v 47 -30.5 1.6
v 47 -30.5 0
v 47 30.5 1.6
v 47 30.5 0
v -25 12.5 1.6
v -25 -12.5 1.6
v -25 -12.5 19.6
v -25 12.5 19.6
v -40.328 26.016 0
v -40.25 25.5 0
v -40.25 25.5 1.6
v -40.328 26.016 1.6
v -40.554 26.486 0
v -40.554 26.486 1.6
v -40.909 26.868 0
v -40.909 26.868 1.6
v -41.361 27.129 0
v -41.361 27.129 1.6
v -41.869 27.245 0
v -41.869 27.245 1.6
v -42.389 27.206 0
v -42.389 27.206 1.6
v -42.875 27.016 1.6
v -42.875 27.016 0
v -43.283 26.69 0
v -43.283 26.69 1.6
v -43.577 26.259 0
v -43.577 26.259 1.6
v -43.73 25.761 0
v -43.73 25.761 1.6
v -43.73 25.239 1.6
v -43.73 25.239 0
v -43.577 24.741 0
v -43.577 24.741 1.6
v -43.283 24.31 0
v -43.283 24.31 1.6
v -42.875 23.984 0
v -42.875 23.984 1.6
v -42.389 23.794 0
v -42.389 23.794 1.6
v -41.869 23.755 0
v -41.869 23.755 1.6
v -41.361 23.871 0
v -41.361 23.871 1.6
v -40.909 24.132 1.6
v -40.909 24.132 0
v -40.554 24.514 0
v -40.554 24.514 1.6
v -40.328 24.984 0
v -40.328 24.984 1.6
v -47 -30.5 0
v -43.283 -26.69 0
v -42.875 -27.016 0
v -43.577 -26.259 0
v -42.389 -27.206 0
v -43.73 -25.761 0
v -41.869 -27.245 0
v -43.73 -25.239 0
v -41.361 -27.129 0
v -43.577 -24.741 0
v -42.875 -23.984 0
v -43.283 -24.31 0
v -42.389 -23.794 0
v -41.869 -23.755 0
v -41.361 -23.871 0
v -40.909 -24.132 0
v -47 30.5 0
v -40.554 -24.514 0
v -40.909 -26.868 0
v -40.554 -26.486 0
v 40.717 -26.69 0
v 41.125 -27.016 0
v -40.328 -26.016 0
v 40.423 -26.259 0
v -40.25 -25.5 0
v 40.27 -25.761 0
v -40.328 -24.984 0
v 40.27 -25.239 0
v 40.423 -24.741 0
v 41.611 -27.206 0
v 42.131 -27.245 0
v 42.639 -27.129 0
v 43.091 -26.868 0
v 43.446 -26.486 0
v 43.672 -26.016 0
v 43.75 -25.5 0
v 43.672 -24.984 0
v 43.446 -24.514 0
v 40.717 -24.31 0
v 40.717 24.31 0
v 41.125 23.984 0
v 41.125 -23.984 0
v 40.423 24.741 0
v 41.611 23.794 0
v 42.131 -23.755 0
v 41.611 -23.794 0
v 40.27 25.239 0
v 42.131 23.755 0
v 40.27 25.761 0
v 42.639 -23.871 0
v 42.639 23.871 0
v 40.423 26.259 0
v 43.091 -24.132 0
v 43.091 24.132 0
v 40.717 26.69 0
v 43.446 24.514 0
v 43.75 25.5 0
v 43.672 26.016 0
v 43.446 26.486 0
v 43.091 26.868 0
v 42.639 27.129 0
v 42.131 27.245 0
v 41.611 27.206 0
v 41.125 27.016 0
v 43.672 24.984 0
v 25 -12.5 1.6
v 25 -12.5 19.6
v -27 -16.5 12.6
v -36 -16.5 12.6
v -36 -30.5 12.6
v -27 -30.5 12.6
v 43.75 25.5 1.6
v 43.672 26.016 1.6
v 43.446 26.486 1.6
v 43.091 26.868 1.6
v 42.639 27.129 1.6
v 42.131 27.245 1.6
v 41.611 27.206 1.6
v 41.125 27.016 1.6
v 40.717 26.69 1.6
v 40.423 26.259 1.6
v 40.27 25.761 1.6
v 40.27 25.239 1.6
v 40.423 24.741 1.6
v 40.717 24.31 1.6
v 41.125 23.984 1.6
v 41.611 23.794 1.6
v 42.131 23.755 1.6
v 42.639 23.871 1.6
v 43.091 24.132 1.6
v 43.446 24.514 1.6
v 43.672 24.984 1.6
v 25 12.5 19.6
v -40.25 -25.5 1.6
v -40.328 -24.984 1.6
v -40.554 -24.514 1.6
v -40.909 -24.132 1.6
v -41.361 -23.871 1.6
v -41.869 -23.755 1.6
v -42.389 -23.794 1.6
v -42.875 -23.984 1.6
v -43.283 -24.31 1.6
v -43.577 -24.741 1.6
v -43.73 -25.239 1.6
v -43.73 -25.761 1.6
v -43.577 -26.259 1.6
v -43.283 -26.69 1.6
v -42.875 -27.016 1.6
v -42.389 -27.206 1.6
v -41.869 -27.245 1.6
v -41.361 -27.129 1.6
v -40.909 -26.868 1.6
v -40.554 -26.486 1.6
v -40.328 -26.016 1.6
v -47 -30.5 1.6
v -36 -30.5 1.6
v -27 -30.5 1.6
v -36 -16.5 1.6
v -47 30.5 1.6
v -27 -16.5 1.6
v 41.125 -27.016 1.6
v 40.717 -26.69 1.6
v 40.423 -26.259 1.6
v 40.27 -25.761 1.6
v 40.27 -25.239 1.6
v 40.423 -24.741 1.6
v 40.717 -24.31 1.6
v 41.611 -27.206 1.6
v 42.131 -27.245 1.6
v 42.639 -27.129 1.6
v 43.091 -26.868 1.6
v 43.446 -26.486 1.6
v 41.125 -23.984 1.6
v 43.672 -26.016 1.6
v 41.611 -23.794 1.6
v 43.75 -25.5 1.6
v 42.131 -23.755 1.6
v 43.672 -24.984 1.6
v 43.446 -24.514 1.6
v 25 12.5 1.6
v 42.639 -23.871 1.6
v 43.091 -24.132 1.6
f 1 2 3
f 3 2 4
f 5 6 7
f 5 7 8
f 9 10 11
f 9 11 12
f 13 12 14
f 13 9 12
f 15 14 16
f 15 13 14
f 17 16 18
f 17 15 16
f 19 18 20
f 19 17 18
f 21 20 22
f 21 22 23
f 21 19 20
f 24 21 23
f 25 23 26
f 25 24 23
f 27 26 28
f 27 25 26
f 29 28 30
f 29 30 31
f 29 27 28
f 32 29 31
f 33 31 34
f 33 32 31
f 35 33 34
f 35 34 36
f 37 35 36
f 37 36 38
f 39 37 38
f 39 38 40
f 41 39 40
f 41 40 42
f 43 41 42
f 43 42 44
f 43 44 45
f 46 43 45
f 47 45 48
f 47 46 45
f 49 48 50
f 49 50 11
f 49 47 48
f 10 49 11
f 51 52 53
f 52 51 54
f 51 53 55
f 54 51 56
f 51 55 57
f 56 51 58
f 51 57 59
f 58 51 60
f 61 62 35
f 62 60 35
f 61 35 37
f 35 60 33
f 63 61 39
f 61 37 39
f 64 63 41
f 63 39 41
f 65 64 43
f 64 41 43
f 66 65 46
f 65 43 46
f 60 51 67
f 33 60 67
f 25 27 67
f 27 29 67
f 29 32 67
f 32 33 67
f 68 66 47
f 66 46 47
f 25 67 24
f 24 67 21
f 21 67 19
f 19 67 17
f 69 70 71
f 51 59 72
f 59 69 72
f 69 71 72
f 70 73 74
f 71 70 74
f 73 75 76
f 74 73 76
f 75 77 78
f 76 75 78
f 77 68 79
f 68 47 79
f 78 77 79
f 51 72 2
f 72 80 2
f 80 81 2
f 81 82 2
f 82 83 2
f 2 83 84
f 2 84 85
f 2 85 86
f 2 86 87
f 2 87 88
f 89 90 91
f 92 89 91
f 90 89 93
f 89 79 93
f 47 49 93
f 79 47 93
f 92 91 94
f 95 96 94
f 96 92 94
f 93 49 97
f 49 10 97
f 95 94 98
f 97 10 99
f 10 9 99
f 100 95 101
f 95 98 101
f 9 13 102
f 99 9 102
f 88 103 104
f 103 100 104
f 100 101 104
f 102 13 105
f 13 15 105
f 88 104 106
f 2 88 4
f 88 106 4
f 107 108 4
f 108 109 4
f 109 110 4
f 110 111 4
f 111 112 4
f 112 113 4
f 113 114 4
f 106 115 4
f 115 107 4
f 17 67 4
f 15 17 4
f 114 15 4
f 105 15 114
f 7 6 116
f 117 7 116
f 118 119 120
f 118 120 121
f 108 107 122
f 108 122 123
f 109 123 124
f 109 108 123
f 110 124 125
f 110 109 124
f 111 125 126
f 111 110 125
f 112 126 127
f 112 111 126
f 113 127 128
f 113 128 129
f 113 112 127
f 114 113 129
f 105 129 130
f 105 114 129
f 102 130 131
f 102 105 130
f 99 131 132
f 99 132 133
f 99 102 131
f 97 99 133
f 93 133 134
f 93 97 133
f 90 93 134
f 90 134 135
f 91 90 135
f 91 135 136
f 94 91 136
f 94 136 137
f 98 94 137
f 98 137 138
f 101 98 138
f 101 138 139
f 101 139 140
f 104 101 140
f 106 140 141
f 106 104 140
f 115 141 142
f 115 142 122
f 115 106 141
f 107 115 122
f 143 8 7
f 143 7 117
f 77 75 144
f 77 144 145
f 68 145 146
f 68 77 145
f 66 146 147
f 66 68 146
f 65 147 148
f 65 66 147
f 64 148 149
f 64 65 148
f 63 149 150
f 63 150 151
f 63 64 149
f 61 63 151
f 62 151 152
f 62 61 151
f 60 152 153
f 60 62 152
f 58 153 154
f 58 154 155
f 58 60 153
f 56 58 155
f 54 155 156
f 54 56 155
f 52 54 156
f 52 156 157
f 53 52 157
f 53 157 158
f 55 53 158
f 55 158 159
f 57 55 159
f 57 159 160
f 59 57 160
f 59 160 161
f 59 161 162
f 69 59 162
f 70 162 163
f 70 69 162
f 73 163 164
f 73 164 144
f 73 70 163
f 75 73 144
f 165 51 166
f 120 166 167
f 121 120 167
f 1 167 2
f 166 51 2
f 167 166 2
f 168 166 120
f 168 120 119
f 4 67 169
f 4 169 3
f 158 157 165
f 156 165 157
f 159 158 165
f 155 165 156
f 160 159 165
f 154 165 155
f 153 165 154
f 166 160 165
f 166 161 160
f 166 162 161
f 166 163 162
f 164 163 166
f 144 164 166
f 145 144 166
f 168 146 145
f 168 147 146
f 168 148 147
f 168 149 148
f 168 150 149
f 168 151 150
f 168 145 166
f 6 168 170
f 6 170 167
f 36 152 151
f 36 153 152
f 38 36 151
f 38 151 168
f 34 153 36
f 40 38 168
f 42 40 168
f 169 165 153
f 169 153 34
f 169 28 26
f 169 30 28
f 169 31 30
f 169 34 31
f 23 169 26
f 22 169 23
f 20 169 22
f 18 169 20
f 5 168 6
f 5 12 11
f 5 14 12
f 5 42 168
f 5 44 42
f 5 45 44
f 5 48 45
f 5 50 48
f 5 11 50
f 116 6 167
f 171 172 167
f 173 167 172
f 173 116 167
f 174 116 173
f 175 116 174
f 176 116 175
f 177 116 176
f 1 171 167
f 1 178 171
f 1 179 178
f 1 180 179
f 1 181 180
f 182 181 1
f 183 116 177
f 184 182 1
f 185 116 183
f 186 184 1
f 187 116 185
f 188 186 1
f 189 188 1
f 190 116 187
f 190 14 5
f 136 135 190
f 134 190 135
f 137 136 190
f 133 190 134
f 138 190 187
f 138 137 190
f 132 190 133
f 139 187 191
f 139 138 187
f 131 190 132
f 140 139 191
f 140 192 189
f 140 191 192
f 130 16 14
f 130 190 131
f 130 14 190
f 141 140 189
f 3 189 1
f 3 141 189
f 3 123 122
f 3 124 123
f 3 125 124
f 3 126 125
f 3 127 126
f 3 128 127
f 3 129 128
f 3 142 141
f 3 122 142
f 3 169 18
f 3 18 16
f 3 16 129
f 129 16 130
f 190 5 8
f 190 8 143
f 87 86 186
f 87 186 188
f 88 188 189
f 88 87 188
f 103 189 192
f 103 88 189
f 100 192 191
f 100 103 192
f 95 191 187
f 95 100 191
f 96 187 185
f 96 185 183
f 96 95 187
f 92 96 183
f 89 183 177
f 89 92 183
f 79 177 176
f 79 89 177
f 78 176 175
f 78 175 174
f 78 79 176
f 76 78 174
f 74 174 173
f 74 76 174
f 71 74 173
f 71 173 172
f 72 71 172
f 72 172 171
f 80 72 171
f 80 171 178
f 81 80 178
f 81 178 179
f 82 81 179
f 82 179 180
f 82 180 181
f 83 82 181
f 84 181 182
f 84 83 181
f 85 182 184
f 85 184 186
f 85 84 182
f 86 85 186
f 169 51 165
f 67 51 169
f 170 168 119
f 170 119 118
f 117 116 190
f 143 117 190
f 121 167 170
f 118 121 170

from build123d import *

# Parameters (mm, degrees)
ESQUISSE1_W        = 94
ESQUISSE1_H        = 61
ESQUISSE1_R        = 1.75
BOSS_EXTRU_1_DEPTH = 1.6
ESQUISSE2_W        = 50
ESQUISSE2_H        = 25
BOSS_EXTRU_2_DEPTH = 18
ESQUISSE3_W        = 9
ESQUISSE3_H        = 14
BOSS_EXTRU_3_DEPTH = 11


with BuildPart() as part:
    # Esquisse1 → Boss.-Extru.1 (new body)
    with BuildSketch(Plane.XY):
        Rectangle(ESQUISSE1_W, ESQUISSE1_H)
        with Locations((-42, 25.5)):
            Circle(ESQUISSE1_R, mode=Mode.SUBTRACT)
        with Locations((42, 25.5)):
            Circle(ESQUISSE1_R, mode=Mode.SUBTRACT)
        with Locations((42, -25.5)):
            Circle(ESQUISSE1_R, mode=Mode.SUBTRACT)
        with Locations((-42, -25.5)):
            Circle(ESQUISSE1_R, mode=Mode.SUBTRACT)
    extrude(amount=BOSS_EXTRU_1_DEPTH)

    # Esquisse2 → Boss.-Extru.2 (add)
    with BuildSketch(Plane.XY.offset(1.6)):
        Rectangle(ESQUISSE2_W, ESQUISSE2_H)
    extrude(amount=BOSS_EXTRU_2_DEPTH)

    # Esquisse3 → Boss.-Extru.3 (add)
    with BuildSketch(Plane.XY.offset(1.6)):
        with Locations((-31.5, -23.5)):
            Rectangle(ESQUISSE3_W, ESQUISSE3_H)
    extrude(amount=BOSS_EXTRU_3_DEPTH)


solid = part.part
